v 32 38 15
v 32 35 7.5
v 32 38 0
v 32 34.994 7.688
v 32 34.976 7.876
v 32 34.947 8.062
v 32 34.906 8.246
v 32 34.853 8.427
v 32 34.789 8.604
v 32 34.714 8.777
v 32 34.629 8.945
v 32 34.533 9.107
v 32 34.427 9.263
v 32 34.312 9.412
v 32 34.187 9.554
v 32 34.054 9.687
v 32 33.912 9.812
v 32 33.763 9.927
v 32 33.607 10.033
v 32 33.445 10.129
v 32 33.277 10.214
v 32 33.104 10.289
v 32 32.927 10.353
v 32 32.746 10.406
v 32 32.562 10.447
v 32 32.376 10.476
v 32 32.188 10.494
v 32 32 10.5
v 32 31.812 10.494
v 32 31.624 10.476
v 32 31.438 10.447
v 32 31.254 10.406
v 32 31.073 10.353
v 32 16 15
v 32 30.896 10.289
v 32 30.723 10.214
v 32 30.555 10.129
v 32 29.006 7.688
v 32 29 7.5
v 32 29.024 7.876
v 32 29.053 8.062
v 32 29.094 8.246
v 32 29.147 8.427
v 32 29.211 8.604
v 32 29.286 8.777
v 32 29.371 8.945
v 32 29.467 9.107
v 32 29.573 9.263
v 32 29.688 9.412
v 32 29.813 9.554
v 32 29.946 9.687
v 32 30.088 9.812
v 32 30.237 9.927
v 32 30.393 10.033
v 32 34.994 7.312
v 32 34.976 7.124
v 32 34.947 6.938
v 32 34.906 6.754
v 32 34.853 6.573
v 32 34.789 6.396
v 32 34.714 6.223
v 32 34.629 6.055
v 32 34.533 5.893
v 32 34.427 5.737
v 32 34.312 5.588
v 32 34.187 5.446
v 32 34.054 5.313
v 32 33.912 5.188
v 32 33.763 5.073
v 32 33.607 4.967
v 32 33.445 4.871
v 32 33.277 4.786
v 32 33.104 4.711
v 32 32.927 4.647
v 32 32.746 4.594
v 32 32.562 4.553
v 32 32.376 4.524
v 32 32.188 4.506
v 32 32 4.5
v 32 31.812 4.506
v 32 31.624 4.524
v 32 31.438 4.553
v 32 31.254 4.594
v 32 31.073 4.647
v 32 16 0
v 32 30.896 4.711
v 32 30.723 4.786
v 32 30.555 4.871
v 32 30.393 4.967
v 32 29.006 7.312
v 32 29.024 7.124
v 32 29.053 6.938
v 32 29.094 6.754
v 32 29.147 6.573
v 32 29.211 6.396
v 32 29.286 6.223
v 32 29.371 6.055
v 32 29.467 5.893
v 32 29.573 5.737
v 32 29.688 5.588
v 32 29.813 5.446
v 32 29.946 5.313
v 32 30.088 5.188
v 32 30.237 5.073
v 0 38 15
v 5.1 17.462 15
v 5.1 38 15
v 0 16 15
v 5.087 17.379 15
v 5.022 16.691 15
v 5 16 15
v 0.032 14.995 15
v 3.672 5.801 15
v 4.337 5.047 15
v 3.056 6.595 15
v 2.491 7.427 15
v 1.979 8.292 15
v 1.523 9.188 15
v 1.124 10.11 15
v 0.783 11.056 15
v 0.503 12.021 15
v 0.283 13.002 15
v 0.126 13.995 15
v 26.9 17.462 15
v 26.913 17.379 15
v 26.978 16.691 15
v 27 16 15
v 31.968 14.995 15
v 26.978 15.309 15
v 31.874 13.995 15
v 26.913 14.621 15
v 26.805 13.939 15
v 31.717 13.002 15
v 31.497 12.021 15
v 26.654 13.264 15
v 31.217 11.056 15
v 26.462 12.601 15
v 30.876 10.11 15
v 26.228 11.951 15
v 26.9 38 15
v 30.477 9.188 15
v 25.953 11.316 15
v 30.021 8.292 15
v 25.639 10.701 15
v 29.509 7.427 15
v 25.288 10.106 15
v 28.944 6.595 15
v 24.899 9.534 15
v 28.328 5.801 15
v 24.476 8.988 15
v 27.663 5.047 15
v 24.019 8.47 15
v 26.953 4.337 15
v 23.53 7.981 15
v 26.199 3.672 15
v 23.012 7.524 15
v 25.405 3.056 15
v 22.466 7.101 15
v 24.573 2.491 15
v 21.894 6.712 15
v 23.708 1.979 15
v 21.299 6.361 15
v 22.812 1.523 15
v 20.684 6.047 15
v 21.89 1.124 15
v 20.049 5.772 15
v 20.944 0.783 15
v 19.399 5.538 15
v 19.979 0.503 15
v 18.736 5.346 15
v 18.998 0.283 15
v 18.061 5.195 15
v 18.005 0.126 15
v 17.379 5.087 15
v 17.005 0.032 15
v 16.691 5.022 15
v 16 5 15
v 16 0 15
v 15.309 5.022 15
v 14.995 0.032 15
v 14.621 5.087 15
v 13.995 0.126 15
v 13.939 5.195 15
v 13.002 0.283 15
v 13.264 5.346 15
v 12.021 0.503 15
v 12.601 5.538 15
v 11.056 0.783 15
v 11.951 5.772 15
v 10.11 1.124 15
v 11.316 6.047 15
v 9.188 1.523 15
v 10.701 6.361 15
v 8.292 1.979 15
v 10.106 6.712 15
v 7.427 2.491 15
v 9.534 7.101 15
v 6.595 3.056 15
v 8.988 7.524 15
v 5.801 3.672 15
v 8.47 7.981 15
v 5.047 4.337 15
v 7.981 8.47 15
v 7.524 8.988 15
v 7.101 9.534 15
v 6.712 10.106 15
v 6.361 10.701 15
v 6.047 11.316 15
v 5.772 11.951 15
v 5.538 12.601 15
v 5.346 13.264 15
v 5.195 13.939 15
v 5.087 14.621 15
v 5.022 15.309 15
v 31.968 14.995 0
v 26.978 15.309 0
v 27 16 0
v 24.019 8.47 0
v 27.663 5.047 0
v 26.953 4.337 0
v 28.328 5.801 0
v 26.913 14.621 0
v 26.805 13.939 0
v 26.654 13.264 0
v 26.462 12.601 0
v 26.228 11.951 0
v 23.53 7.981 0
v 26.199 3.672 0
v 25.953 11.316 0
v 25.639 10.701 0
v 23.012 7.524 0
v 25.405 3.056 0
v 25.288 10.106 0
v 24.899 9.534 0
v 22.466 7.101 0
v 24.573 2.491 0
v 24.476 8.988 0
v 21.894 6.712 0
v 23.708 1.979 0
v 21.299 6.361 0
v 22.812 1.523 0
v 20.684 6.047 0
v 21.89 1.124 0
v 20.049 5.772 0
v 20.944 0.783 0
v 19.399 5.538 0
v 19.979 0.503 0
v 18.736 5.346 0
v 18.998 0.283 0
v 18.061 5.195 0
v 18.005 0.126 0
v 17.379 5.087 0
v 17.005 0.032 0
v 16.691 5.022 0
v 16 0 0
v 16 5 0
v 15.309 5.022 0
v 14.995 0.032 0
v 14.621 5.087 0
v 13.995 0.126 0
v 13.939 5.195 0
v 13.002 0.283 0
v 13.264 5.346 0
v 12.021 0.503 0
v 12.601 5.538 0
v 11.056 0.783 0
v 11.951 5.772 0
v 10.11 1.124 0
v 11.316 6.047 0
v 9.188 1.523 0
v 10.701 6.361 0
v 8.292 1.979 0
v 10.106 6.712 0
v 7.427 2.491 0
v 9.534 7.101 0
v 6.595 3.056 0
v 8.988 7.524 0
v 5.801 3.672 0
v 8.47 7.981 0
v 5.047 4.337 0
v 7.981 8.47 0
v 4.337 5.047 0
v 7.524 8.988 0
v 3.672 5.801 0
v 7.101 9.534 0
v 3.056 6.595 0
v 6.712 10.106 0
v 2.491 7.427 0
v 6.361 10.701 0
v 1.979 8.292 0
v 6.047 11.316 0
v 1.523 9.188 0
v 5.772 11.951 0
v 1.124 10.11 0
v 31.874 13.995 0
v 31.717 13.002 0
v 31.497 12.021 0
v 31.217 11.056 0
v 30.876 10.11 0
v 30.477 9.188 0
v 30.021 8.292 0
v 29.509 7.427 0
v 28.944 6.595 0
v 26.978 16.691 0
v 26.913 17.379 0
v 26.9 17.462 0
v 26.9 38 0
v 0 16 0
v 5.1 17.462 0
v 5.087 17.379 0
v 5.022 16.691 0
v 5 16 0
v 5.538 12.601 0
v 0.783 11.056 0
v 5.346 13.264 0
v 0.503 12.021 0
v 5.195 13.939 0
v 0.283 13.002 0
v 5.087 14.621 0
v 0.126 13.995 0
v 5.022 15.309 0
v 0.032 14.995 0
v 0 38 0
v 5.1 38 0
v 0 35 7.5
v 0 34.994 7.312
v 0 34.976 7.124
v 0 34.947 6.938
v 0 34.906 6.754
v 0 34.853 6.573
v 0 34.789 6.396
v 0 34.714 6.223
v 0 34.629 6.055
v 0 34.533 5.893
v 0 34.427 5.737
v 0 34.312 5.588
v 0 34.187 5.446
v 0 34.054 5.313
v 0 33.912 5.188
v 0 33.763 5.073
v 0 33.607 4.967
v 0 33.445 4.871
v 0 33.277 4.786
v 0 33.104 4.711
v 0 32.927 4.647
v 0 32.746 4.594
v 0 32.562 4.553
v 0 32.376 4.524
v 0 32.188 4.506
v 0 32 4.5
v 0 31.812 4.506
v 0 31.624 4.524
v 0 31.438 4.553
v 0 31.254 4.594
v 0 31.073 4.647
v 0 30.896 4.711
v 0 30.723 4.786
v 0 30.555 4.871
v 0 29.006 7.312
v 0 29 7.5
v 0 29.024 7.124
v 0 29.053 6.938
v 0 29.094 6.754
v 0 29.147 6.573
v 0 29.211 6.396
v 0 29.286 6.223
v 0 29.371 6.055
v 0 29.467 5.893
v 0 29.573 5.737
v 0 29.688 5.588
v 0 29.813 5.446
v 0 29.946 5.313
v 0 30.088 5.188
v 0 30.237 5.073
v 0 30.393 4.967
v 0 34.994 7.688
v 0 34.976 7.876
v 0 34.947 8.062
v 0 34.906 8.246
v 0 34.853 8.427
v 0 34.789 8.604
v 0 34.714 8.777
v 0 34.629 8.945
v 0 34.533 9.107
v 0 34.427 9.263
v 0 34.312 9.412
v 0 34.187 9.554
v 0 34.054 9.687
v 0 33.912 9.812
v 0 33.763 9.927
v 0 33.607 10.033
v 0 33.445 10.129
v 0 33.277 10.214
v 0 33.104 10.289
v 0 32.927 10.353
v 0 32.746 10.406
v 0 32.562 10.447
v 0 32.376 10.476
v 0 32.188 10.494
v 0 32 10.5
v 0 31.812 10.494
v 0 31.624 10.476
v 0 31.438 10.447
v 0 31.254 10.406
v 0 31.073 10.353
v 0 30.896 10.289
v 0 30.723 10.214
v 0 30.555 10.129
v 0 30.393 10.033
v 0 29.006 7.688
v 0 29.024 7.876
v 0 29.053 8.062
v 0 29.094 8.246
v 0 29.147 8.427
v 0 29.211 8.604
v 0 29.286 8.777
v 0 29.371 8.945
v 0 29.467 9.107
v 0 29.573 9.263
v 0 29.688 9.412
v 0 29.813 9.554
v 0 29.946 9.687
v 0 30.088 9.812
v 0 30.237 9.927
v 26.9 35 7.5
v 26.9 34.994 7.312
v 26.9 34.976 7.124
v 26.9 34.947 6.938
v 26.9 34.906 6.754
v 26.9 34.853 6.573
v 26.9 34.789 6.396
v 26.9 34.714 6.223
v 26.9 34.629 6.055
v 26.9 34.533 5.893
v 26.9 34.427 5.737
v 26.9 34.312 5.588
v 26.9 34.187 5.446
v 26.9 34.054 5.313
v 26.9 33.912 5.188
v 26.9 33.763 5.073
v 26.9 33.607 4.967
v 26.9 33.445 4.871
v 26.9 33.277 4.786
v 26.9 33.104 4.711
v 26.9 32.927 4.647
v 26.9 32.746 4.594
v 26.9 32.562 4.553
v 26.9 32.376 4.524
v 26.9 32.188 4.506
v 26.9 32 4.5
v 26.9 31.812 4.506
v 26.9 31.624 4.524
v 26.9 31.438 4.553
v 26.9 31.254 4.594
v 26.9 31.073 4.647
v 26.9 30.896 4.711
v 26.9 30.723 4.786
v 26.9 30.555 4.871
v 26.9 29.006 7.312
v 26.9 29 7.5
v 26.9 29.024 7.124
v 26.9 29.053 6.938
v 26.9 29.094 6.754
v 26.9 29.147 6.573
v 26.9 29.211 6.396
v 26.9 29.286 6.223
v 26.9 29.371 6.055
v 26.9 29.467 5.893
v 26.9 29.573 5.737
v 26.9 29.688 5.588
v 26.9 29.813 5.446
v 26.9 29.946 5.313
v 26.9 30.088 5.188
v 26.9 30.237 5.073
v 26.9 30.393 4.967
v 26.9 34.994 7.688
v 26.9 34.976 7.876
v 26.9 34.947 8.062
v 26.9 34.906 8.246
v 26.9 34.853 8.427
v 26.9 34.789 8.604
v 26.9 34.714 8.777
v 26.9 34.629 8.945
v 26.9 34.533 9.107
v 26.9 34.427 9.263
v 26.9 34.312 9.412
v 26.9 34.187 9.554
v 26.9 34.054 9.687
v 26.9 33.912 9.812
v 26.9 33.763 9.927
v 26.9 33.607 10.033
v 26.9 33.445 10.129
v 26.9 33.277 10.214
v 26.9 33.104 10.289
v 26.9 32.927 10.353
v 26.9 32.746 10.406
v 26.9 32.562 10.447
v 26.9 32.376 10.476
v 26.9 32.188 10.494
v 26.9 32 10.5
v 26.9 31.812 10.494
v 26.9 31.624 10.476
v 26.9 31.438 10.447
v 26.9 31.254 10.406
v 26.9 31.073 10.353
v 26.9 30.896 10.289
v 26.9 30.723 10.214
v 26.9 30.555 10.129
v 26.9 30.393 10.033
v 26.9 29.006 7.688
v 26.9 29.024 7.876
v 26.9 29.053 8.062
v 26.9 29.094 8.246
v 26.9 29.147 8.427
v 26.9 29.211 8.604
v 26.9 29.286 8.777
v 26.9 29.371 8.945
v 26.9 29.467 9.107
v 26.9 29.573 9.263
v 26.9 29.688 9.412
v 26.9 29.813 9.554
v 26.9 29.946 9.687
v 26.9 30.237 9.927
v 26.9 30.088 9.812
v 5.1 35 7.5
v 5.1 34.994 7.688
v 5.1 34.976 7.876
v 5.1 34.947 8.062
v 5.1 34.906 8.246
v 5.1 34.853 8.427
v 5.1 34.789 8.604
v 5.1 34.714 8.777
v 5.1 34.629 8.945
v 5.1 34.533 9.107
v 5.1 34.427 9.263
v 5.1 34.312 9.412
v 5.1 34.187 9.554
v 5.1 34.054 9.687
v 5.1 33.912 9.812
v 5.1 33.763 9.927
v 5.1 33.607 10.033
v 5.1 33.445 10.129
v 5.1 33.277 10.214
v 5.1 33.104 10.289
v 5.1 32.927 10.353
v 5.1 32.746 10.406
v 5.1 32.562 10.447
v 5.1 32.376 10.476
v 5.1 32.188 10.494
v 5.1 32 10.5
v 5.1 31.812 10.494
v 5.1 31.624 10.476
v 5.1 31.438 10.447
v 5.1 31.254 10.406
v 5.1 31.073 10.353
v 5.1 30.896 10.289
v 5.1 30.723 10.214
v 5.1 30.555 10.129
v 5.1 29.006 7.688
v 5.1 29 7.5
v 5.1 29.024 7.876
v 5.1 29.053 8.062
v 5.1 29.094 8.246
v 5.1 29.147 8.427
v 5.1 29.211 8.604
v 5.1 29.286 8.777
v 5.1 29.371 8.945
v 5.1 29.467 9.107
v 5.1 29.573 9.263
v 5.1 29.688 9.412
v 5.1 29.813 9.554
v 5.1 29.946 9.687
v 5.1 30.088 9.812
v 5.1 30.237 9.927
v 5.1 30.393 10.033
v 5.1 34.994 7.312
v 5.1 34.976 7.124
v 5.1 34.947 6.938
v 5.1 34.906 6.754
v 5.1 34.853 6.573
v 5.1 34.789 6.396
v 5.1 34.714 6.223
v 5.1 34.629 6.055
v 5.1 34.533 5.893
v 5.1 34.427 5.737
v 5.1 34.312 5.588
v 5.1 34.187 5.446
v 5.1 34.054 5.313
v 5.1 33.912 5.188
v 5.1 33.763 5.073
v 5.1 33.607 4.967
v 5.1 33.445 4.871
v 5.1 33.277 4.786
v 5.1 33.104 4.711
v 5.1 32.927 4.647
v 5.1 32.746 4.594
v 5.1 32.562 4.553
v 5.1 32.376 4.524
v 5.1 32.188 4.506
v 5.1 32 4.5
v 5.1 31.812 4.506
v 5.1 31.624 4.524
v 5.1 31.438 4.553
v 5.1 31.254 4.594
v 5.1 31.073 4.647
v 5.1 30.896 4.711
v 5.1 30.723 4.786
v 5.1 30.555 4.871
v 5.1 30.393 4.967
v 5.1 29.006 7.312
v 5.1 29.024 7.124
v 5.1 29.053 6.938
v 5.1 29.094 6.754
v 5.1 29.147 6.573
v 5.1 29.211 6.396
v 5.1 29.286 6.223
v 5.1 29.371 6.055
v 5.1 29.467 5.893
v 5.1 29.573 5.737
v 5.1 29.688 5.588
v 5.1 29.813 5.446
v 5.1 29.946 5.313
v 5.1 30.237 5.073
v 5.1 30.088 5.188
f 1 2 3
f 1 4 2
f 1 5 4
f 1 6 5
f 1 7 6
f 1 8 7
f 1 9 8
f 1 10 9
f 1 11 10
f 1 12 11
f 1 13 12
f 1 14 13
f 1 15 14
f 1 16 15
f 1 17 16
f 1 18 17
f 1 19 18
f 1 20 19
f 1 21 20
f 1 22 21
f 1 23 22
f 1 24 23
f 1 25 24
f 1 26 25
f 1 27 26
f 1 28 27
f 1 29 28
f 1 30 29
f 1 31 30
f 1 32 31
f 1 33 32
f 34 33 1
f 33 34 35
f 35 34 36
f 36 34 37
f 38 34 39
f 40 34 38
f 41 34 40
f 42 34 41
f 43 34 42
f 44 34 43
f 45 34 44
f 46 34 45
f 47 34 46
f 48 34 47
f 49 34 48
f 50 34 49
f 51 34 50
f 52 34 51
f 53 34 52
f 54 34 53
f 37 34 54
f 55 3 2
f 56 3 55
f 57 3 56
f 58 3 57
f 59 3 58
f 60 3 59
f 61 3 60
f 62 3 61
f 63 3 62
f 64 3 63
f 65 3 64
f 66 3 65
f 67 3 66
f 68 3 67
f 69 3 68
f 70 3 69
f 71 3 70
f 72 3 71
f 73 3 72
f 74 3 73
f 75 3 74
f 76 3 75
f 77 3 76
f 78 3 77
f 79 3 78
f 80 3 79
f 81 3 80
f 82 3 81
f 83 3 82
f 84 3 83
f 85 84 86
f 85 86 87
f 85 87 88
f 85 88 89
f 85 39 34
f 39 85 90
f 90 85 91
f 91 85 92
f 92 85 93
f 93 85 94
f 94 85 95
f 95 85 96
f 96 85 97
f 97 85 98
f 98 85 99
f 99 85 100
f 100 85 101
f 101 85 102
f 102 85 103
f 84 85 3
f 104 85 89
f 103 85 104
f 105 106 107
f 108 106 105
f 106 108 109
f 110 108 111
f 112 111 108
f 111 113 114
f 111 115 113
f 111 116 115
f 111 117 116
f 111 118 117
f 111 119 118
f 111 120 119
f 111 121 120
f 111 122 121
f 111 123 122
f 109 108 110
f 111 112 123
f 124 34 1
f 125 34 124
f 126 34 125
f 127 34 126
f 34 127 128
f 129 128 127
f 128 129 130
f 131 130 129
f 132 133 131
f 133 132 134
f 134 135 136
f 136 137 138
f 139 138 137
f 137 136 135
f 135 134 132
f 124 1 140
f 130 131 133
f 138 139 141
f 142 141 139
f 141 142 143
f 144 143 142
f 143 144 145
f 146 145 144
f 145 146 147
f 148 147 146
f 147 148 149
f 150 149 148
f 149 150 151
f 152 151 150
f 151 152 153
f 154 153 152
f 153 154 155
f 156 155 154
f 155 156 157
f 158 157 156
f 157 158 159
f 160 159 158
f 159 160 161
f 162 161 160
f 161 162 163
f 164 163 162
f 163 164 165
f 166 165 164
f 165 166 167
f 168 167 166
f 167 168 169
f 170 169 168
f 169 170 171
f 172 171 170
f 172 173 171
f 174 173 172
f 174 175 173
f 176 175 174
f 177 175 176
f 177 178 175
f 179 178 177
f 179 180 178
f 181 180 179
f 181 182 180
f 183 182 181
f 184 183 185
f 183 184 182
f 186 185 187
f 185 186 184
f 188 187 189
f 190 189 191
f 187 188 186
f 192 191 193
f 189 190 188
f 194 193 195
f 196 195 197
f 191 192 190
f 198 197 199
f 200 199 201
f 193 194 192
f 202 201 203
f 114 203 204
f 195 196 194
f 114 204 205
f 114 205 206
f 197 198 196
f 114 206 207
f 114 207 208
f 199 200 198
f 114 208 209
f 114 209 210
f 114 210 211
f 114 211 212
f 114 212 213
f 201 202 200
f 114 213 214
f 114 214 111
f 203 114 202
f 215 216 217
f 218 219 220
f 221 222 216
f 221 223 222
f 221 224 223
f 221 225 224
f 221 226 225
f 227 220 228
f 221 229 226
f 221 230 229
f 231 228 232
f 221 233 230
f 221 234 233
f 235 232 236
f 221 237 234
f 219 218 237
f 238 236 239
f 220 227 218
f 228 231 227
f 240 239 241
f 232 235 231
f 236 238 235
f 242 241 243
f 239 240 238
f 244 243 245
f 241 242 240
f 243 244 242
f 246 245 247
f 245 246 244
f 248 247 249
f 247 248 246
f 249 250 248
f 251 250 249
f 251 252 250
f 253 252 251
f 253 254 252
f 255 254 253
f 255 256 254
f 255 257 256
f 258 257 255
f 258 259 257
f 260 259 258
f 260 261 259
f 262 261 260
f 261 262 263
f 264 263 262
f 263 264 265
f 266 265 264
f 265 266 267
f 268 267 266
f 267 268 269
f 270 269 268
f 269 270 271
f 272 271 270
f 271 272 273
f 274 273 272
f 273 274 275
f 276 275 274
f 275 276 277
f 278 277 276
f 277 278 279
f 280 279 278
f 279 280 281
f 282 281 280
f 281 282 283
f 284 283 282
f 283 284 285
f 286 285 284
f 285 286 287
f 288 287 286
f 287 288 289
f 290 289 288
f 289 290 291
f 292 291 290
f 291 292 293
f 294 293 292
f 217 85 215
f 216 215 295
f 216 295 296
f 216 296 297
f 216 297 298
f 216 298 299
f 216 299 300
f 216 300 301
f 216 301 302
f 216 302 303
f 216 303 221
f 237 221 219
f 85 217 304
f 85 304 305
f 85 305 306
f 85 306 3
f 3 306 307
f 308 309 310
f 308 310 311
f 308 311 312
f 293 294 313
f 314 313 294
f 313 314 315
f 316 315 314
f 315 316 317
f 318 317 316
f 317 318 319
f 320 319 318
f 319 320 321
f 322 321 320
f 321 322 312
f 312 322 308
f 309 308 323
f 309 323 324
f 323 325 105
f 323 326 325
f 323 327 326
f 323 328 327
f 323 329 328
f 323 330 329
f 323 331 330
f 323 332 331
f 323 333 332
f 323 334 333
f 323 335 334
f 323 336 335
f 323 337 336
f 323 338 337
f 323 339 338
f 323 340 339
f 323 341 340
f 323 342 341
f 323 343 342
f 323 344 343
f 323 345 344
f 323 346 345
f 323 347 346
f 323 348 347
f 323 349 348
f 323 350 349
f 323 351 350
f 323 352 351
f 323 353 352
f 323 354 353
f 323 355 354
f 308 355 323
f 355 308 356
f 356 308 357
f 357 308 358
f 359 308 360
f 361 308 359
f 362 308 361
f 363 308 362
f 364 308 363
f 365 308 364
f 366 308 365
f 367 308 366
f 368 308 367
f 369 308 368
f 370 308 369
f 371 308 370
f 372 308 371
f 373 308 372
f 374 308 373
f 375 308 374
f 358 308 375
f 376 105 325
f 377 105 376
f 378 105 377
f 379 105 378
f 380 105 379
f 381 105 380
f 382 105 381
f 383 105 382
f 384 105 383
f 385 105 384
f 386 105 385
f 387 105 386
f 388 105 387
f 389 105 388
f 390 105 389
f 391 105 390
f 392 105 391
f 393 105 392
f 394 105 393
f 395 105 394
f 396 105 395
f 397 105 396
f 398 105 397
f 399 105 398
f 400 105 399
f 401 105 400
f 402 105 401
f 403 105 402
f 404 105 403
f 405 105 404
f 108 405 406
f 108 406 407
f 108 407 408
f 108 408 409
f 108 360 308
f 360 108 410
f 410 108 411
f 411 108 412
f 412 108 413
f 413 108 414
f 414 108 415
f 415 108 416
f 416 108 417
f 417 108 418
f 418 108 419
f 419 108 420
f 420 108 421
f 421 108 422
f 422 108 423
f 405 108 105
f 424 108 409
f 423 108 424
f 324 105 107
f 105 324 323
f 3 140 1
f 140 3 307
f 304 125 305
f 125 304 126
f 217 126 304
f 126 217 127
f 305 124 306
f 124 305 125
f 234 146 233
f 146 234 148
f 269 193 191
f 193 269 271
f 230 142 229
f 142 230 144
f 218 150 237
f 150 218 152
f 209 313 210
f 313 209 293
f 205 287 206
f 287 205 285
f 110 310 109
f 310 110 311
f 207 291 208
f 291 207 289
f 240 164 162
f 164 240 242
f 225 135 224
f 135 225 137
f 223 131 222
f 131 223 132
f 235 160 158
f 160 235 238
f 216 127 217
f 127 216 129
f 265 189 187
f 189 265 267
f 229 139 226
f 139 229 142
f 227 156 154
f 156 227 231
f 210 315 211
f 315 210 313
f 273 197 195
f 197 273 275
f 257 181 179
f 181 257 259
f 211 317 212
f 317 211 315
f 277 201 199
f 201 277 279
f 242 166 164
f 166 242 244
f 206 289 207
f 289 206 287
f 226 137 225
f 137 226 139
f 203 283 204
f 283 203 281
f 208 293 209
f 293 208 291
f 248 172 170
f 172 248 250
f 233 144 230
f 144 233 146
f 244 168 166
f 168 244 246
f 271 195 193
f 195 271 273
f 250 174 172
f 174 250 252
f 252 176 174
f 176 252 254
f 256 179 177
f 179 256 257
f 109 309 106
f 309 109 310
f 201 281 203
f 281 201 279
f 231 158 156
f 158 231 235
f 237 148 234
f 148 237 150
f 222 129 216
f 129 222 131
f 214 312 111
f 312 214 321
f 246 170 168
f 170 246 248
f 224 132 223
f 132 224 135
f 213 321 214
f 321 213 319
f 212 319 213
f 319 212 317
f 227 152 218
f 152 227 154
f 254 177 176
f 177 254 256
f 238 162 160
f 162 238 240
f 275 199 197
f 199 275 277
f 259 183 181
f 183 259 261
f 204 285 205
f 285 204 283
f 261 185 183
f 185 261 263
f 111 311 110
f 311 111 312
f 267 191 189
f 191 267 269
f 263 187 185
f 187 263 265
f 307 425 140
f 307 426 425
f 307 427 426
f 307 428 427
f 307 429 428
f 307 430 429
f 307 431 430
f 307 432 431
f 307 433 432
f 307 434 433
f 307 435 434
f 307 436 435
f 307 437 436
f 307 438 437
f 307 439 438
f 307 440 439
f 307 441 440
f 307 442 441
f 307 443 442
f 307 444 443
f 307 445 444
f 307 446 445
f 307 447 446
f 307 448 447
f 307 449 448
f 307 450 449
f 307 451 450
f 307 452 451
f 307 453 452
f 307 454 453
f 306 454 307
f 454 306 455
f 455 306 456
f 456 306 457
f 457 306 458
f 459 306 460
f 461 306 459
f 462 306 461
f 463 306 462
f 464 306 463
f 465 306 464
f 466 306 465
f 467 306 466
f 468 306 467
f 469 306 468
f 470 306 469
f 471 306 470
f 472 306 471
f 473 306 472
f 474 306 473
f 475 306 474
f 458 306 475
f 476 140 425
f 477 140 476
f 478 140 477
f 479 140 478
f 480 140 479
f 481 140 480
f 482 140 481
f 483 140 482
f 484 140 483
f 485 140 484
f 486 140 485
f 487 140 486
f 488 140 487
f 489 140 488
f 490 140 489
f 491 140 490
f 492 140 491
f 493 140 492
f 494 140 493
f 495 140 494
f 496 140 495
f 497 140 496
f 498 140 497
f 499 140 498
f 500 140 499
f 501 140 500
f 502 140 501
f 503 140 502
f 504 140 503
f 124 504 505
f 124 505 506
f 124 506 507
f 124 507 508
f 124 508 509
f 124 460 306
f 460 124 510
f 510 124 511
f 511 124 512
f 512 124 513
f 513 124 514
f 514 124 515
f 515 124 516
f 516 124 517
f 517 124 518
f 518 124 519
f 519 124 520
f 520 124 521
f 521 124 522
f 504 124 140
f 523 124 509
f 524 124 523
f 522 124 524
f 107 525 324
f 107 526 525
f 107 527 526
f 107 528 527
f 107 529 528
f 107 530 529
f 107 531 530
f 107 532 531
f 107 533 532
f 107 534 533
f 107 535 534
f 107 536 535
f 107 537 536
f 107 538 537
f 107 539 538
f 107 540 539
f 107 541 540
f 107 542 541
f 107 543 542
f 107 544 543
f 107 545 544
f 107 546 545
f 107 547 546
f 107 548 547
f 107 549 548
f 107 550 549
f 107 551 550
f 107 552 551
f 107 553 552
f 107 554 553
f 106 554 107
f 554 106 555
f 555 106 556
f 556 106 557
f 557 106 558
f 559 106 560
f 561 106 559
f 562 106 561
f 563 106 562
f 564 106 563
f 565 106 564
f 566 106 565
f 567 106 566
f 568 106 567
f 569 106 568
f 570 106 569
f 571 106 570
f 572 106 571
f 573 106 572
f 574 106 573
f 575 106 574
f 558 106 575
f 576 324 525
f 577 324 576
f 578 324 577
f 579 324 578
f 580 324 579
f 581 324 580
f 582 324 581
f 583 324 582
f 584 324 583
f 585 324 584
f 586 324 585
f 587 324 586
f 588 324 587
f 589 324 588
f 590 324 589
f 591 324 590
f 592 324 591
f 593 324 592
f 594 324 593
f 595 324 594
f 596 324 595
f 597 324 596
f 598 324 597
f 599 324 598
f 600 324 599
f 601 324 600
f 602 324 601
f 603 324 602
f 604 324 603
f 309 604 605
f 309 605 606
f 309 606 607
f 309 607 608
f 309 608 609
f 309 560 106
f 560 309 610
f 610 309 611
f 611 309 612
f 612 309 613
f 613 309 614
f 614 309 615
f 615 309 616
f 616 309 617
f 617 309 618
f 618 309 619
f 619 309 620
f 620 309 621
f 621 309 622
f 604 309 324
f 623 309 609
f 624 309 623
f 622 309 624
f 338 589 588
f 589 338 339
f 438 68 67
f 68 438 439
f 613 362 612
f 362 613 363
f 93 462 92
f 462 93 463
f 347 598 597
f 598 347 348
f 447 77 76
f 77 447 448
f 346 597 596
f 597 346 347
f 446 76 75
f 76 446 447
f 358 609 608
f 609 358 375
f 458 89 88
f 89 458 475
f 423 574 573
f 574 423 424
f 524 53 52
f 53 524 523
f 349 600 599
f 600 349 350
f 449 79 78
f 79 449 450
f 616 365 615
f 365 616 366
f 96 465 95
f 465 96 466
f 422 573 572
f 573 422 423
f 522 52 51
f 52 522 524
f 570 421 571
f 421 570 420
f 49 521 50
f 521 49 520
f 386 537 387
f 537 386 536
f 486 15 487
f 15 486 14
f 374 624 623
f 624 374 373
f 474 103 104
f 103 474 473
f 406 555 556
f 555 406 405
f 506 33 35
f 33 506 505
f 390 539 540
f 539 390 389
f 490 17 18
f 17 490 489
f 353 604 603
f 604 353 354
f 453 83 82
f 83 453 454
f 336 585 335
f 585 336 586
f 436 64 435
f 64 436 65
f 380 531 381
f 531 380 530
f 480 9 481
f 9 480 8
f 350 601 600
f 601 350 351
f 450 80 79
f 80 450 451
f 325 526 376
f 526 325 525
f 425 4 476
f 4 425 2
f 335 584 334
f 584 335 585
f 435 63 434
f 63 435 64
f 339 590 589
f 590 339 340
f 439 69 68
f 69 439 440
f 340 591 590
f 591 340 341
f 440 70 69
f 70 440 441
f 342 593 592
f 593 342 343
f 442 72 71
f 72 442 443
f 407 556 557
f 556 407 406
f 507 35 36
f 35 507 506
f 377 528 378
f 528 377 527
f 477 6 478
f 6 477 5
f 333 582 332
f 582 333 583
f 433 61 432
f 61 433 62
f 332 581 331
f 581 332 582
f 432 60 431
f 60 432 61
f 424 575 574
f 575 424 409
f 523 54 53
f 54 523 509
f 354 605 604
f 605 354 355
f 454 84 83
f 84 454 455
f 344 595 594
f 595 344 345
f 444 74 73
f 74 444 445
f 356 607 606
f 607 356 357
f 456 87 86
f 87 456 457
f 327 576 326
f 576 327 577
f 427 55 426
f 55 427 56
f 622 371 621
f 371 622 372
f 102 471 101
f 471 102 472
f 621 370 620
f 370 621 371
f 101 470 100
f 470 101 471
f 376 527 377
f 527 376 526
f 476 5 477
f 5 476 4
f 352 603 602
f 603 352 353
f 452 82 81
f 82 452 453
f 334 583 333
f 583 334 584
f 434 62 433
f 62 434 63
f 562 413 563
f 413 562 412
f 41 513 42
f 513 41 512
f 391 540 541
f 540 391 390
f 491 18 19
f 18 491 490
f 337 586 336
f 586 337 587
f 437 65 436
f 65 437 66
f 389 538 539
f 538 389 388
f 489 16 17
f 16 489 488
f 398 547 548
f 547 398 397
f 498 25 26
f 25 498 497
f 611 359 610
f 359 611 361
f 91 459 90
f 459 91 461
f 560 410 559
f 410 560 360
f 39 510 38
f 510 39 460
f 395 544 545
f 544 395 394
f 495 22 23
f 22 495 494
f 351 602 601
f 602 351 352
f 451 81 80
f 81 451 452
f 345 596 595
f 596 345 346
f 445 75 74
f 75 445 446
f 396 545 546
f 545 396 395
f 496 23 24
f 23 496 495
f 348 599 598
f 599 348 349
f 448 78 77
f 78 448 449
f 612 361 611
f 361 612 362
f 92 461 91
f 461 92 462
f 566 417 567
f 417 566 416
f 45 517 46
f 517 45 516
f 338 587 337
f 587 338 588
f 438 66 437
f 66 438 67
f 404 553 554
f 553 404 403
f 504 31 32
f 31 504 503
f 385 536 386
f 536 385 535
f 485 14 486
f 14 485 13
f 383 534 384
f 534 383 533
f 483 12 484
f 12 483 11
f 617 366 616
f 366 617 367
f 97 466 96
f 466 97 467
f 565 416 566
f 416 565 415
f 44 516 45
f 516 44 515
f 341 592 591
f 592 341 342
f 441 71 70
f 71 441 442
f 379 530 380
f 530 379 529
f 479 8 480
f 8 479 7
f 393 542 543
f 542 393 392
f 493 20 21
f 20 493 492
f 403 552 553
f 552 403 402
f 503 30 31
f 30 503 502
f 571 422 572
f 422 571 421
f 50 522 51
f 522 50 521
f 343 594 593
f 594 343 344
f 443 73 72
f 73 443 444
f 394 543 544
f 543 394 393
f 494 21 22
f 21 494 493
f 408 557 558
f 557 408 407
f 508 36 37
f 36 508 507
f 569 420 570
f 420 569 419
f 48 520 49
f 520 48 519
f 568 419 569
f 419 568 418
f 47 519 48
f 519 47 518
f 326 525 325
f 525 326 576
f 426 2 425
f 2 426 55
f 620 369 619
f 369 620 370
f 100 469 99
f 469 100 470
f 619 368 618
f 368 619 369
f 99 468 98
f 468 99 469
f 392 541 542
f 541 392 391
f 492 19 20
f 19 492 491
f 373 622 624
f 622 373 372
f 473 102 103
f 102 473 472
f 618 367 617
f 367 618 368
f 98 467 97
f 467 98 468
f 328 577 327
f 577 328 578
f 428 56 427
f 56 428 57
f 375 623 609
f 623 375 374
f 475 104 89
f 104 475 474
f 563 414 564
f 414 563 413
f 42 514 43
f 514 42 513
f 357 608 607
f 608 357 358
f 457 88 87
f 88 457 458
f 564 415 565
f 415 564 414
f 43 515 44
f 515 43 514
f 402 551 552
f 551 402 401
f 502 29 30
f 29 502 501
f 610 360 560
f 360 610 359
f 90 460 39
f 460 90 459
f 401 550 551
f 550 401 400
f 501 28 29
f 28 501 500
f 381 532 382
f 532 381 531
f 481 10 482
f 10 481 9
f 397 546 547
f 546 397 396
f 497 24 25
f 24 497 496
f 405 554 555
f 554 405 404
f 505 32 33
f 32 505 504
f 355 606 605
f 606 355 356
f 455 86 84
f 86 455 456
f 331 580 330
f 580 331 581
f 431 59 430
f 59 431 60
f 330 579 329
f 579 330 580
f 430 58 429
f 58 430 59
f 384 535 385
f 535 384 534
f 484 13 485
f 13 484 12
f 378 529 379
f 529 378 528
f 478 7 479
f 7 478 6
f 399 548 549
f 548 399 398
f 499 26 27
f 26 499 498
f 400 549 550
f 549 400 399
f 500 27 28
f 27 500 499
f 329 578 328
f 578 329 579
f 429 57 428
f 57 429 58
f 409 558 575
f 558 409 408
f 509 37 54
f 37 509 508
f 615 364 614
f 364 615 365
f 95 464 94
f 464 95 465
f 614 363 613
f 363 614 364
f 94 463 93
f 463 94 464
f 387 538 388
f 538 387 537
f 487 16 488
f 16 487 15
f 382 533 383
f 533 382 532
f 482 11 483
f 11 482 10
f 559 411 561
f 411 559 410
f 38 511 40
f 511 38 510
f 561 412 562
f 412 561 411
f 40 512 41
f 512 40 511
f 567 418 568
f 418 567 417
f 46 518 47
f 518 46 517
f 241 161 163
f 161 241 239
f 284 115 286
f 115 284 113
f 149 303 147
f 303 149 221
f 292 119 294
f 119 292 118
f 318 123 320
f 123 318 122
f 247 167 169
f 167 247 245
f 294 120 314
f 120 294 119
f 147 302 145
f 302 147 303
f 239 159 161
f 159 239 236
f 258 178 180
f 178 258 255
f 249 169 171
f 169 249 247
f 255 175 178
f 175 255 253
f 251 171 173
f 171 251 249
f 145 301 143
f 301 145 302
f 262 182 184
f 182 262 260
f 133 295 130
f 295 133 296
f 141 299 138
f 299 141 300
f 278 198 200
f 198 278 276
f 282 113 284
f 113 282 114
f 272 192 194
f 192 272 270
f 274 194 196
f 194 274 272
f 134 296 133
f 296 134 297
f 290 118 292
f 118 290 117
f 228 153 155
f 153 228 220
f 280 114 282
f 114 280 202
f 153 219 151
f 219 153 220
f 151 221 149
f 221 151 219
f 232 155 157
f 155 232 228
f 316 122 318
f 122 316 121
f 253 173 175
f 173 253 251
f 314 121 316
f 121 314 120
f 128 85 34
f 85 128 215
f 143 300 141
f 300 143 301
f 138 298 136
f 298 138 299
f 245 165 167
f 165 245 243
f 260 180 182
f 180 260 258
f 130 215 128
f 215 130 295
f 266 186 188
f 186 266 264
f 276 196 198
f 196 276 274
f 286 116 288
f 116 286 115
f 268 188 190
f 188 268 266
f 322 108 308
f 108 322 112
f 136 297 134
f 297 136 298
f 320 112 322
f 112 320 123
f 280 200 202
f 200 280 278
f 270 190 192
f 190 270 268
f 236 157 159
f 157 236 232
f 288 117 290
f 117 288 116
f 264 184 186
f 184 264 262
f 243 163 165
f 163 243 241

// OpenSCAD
$fn=100;

intersection() {
    difference()
    {
        cube([32, 38, 15]);
        translate([16, 16, -1])
        {
            cylinder(17, 11, 11);
        }  
        translate([5.1, 15, -1])
        {
            cube([21.8, 24, 17]);
        }  
        translate([-1, 32, 7.5])
        {
            rotate([0, 90, 0])
            {
                cylinder(35, 3, 3);
            }    
        }
    }
    group() {
        translate([16, 16, 0]) {
            cylinder(20, 16, 16);
        }
        translate([0, 16, 0]) {
            cube([32, 100, 20]);
        }
    }
}
